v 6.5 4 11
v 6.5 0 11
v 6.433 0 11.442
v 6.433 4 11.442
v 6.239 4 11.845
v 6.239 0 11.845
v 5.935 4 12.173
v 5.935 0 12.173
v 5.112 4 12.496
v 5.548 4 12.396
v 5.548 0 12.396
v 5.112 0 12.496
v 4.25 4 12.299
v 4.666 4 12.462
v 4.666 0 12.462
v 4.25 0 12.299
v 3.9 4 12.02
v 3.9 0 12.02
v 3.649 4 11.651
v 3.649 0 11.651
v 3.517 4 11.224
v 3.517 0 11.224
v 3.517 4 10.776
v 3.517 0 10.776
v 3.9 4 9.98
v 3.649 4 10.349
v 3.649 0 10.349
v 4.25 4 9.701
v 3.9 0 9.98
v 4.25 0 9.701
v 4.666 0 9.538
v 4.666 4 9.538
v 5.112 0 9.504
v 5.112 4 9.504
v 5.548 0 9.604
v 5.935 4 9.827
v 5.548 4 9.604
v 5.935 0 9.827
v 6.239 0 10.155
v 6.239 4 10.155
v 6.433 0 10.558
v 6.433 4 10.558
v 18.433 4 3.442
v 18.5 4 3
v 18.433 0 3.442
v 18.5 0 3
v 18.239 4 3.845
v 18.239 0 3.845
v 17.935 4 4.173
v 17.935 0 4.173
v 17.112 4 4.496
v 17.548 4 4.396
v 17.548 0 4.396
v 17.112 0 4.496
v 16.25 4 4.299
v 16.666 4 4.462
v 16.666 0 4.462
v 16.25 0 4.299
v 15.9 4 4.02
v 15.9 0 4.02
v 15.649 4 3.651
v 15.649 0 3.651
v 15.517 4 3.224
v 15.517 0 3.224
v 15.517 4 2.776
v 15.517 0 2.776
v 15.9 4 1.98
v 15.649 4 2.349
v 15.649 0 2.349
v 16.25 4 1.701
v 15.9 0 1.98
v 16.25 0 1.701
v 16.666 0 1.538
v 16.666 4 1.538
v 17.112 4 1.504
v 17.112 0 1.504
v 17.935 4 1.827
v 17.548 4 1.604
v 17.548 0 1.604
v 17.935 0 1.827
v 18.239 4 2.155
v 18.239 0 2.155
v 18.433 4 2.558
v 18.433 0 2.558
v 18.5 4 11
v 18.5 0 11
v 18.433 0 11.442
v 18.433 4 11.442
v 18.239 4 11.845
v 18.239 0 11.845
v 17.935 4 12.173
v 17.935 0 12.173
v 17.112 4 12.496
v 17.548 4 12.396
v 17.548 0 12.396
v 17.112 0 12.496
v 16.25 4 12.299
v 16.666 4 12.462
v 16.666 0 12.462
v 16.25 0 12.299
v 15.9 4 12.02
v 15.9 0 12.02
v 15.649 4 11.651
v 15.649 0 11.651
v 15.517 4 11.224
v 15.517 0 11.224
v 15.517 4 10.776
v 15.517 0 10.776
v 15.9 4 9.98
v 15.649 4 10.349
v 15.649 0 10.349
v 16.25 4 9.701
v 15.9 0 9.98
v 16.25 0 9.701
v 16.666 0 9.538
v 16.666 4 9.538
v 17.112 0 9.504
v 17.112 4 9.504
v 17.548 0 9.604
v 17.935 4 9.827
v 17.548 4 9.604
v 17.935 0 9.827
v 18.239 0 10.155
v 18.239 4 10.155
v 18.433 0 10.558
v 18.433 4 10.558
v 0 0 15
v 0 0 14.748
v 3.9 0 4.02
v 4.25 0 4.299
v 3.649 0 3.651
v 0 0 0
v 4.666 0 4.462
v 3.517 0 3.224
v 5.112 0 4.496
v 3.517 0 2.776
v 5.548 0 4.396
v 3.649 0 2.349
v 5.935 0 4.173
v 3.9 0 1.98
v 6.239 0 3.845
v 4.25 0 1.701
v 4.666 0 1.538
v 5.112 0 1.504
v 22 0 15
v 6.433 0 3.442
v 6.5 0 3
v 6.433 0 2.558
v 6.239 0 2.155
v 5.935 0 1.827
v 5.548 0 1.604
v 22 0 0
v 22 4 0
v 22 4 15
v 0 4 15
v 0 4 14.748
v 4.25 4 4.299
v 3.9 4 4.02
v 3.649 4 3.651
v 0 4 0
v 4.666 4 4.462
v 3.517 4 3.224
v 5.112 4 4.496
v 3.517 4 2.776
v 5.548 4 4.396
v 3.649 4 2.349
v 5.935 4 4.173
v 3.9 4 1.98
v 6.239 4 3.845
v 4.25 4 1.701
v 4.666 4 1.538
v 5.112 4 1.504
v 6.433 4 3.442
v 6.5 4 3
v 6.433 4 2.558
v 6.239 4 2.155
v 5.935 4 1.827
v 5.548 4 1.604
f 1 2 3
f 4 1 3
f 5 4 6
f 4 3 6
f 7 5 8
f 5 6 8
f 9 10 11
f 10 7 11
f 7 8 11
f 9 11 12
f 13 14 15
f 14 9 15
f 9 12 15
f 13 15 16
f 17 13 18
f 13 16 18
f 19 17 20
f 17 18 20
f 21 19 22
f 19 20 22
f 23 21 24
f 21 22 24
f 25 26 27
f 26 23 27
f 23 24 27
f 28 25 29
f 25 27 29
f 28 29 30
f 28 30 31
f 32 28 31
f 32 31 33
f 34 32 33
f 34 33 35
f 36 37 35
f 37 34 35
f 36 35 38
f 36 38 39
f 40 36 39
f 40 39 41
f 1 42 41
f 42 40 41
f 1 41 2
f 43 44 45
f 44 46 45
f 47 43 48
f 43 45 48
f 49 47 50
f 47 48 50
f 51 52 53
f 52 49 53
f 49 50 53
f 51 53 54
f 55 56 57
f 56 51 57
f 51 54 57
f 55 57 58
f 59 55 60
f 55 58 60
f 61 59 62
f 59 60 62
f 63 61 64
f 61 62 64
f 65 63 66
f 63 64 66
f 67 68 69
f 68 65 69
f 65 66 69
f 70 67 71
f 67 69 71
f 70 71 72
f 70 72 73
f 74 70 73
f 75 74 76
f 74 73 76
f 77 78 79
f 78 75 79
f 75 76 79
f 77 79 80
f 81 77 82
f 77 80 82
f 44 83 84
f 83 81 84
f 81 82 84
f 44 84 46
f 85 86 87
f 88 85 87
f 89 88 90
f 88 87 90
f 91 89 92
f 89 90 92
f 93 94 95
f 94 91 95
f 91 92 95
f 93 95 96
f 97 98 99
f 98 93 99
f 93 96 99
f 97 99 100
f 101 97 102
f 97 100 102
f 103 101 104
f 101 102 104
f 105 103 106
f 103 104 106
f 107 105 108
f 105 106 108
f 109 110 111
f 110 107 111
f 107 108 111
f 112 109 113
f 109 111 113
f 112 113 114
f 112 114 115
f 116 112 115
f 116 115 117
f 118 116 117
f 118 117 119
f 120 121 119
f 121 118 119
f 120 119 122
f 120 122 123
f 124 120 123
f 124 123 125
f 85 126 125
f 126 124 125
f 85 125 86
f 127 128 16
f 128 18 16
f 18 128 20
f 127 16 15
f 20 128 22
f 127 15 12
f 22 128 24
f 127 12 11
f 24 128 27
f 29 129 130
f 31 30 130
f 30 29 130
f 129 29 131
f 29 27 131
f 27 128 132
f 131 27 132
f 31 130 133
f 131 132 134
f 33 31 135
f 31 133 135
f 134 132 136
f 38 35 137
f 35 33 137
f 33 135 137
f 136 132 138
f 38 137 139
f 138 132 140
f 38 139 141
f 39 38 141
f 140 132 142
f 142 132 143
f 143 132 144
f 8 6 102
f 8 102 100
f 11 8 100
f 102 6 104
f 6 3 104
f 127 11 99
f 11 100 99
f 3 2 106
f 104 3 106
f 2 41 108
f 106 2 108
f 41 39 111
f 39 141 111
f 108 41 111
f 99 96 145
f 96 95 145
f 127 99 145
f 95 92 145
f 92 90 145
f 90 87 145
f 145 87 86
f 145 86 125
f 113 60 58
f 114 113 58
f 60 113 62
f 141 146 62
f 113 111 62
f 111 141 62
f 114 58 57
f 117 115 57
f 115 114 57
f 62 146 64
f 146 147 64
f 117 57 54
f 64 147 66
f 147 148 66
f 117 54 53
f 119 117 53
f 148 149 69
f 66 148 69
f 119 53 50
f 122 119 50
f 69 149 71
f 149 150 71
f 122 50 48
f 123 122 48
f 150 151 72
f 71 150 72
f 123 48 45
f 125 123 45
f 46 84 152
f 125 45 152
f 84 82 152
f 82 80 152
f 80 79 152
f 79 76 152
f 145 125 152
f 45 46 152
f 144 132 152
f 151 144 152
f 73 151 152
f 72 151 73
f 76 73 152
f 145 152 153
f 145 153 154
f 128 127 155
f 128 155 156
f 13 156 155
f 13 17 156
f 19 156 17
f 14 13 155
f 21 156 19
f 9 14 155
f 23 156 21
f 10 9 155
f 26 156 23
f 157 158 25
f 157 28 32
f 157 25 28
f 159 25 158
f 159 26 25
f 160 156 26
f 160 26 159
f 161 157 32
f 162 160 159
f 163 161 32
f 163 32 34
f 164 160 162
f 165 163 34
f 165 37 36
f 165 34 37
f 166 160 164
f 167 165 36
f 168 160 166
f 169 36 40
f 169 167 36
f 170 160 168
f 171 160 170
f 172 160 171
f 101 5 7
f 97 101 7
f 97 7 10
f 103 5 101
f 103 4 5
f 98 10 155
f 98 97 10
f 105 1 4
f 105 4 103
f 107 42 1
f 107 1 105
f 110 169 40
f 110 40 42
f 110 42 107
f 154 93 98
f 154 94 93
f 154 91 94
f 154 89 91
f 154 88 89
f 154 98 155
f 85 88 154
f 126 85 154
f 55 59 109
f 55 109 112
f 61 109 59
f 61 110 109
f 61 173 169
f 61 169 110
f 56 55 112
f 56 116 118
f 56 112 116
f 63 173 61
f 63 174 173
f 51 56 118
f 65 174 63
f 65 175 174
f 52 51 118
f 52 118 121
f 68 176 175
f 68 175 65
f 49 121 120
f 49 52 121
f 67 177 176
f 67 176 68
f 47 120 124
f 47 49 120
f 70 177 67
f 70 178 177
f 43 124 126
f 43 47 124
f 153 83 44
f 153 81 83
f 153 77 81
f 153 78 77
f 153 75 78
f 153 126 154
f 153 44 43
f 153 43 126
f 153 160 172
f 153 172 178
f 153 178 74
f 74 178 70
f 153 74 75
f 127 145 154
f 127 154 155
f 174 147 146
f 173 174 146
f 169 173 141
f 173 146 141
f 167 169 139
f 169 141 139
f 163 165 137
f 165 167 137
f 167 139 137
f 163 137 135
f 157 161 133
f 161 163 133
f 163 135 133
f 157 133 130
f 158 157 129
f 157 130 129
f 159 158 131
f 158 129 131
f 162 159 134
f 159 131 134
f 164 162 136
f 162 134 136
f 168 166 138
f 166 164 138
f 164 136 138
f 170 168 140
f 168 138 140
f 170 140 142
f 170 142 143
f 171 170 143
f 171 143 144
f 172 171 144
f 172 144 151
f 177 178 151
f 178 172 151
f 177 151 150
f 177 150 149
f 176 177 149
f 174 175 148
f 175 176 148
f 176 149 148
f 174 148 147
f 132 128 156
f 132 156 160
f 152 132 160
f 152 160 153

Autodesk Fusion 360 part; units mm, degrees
sketch "Sketch1" plane through (0, 0, 0) normal (0, 1, 0) x (1, 0, 0)
  line L0 (0, 0) -> (22, 0)
  line L1 (22, 0) -> (22, -15)
  line L2 (22, -15) -> (0, -15)
  line L3 (0, -15) -> (0, 0)
  circle A0 centre (17, -11) radius 1.5
  line L4 (0, -15) -> (0, -14.748)
  circle A1 centre (5, -3) radius 1.5
  circle A2 centre (17, -3) radius 1.5
  circle A3 centre (5, -11) radius 1.5
  dimension "d11" = 3
  dimension "d18" = 3
  dimension "d21" = 3
  dimension "d24" = 3
extrude "Extrude1" add sketch "Sketch1" along normal blind 4 makes body 1
copy_body "Body->Comp1" bodies 1 removing the originals makes body 2 in component "Component"
component "Component" placed x (1, 0, 0) y (0, 1, 0) z (0, 0, 1) at (0, 0, 0)
